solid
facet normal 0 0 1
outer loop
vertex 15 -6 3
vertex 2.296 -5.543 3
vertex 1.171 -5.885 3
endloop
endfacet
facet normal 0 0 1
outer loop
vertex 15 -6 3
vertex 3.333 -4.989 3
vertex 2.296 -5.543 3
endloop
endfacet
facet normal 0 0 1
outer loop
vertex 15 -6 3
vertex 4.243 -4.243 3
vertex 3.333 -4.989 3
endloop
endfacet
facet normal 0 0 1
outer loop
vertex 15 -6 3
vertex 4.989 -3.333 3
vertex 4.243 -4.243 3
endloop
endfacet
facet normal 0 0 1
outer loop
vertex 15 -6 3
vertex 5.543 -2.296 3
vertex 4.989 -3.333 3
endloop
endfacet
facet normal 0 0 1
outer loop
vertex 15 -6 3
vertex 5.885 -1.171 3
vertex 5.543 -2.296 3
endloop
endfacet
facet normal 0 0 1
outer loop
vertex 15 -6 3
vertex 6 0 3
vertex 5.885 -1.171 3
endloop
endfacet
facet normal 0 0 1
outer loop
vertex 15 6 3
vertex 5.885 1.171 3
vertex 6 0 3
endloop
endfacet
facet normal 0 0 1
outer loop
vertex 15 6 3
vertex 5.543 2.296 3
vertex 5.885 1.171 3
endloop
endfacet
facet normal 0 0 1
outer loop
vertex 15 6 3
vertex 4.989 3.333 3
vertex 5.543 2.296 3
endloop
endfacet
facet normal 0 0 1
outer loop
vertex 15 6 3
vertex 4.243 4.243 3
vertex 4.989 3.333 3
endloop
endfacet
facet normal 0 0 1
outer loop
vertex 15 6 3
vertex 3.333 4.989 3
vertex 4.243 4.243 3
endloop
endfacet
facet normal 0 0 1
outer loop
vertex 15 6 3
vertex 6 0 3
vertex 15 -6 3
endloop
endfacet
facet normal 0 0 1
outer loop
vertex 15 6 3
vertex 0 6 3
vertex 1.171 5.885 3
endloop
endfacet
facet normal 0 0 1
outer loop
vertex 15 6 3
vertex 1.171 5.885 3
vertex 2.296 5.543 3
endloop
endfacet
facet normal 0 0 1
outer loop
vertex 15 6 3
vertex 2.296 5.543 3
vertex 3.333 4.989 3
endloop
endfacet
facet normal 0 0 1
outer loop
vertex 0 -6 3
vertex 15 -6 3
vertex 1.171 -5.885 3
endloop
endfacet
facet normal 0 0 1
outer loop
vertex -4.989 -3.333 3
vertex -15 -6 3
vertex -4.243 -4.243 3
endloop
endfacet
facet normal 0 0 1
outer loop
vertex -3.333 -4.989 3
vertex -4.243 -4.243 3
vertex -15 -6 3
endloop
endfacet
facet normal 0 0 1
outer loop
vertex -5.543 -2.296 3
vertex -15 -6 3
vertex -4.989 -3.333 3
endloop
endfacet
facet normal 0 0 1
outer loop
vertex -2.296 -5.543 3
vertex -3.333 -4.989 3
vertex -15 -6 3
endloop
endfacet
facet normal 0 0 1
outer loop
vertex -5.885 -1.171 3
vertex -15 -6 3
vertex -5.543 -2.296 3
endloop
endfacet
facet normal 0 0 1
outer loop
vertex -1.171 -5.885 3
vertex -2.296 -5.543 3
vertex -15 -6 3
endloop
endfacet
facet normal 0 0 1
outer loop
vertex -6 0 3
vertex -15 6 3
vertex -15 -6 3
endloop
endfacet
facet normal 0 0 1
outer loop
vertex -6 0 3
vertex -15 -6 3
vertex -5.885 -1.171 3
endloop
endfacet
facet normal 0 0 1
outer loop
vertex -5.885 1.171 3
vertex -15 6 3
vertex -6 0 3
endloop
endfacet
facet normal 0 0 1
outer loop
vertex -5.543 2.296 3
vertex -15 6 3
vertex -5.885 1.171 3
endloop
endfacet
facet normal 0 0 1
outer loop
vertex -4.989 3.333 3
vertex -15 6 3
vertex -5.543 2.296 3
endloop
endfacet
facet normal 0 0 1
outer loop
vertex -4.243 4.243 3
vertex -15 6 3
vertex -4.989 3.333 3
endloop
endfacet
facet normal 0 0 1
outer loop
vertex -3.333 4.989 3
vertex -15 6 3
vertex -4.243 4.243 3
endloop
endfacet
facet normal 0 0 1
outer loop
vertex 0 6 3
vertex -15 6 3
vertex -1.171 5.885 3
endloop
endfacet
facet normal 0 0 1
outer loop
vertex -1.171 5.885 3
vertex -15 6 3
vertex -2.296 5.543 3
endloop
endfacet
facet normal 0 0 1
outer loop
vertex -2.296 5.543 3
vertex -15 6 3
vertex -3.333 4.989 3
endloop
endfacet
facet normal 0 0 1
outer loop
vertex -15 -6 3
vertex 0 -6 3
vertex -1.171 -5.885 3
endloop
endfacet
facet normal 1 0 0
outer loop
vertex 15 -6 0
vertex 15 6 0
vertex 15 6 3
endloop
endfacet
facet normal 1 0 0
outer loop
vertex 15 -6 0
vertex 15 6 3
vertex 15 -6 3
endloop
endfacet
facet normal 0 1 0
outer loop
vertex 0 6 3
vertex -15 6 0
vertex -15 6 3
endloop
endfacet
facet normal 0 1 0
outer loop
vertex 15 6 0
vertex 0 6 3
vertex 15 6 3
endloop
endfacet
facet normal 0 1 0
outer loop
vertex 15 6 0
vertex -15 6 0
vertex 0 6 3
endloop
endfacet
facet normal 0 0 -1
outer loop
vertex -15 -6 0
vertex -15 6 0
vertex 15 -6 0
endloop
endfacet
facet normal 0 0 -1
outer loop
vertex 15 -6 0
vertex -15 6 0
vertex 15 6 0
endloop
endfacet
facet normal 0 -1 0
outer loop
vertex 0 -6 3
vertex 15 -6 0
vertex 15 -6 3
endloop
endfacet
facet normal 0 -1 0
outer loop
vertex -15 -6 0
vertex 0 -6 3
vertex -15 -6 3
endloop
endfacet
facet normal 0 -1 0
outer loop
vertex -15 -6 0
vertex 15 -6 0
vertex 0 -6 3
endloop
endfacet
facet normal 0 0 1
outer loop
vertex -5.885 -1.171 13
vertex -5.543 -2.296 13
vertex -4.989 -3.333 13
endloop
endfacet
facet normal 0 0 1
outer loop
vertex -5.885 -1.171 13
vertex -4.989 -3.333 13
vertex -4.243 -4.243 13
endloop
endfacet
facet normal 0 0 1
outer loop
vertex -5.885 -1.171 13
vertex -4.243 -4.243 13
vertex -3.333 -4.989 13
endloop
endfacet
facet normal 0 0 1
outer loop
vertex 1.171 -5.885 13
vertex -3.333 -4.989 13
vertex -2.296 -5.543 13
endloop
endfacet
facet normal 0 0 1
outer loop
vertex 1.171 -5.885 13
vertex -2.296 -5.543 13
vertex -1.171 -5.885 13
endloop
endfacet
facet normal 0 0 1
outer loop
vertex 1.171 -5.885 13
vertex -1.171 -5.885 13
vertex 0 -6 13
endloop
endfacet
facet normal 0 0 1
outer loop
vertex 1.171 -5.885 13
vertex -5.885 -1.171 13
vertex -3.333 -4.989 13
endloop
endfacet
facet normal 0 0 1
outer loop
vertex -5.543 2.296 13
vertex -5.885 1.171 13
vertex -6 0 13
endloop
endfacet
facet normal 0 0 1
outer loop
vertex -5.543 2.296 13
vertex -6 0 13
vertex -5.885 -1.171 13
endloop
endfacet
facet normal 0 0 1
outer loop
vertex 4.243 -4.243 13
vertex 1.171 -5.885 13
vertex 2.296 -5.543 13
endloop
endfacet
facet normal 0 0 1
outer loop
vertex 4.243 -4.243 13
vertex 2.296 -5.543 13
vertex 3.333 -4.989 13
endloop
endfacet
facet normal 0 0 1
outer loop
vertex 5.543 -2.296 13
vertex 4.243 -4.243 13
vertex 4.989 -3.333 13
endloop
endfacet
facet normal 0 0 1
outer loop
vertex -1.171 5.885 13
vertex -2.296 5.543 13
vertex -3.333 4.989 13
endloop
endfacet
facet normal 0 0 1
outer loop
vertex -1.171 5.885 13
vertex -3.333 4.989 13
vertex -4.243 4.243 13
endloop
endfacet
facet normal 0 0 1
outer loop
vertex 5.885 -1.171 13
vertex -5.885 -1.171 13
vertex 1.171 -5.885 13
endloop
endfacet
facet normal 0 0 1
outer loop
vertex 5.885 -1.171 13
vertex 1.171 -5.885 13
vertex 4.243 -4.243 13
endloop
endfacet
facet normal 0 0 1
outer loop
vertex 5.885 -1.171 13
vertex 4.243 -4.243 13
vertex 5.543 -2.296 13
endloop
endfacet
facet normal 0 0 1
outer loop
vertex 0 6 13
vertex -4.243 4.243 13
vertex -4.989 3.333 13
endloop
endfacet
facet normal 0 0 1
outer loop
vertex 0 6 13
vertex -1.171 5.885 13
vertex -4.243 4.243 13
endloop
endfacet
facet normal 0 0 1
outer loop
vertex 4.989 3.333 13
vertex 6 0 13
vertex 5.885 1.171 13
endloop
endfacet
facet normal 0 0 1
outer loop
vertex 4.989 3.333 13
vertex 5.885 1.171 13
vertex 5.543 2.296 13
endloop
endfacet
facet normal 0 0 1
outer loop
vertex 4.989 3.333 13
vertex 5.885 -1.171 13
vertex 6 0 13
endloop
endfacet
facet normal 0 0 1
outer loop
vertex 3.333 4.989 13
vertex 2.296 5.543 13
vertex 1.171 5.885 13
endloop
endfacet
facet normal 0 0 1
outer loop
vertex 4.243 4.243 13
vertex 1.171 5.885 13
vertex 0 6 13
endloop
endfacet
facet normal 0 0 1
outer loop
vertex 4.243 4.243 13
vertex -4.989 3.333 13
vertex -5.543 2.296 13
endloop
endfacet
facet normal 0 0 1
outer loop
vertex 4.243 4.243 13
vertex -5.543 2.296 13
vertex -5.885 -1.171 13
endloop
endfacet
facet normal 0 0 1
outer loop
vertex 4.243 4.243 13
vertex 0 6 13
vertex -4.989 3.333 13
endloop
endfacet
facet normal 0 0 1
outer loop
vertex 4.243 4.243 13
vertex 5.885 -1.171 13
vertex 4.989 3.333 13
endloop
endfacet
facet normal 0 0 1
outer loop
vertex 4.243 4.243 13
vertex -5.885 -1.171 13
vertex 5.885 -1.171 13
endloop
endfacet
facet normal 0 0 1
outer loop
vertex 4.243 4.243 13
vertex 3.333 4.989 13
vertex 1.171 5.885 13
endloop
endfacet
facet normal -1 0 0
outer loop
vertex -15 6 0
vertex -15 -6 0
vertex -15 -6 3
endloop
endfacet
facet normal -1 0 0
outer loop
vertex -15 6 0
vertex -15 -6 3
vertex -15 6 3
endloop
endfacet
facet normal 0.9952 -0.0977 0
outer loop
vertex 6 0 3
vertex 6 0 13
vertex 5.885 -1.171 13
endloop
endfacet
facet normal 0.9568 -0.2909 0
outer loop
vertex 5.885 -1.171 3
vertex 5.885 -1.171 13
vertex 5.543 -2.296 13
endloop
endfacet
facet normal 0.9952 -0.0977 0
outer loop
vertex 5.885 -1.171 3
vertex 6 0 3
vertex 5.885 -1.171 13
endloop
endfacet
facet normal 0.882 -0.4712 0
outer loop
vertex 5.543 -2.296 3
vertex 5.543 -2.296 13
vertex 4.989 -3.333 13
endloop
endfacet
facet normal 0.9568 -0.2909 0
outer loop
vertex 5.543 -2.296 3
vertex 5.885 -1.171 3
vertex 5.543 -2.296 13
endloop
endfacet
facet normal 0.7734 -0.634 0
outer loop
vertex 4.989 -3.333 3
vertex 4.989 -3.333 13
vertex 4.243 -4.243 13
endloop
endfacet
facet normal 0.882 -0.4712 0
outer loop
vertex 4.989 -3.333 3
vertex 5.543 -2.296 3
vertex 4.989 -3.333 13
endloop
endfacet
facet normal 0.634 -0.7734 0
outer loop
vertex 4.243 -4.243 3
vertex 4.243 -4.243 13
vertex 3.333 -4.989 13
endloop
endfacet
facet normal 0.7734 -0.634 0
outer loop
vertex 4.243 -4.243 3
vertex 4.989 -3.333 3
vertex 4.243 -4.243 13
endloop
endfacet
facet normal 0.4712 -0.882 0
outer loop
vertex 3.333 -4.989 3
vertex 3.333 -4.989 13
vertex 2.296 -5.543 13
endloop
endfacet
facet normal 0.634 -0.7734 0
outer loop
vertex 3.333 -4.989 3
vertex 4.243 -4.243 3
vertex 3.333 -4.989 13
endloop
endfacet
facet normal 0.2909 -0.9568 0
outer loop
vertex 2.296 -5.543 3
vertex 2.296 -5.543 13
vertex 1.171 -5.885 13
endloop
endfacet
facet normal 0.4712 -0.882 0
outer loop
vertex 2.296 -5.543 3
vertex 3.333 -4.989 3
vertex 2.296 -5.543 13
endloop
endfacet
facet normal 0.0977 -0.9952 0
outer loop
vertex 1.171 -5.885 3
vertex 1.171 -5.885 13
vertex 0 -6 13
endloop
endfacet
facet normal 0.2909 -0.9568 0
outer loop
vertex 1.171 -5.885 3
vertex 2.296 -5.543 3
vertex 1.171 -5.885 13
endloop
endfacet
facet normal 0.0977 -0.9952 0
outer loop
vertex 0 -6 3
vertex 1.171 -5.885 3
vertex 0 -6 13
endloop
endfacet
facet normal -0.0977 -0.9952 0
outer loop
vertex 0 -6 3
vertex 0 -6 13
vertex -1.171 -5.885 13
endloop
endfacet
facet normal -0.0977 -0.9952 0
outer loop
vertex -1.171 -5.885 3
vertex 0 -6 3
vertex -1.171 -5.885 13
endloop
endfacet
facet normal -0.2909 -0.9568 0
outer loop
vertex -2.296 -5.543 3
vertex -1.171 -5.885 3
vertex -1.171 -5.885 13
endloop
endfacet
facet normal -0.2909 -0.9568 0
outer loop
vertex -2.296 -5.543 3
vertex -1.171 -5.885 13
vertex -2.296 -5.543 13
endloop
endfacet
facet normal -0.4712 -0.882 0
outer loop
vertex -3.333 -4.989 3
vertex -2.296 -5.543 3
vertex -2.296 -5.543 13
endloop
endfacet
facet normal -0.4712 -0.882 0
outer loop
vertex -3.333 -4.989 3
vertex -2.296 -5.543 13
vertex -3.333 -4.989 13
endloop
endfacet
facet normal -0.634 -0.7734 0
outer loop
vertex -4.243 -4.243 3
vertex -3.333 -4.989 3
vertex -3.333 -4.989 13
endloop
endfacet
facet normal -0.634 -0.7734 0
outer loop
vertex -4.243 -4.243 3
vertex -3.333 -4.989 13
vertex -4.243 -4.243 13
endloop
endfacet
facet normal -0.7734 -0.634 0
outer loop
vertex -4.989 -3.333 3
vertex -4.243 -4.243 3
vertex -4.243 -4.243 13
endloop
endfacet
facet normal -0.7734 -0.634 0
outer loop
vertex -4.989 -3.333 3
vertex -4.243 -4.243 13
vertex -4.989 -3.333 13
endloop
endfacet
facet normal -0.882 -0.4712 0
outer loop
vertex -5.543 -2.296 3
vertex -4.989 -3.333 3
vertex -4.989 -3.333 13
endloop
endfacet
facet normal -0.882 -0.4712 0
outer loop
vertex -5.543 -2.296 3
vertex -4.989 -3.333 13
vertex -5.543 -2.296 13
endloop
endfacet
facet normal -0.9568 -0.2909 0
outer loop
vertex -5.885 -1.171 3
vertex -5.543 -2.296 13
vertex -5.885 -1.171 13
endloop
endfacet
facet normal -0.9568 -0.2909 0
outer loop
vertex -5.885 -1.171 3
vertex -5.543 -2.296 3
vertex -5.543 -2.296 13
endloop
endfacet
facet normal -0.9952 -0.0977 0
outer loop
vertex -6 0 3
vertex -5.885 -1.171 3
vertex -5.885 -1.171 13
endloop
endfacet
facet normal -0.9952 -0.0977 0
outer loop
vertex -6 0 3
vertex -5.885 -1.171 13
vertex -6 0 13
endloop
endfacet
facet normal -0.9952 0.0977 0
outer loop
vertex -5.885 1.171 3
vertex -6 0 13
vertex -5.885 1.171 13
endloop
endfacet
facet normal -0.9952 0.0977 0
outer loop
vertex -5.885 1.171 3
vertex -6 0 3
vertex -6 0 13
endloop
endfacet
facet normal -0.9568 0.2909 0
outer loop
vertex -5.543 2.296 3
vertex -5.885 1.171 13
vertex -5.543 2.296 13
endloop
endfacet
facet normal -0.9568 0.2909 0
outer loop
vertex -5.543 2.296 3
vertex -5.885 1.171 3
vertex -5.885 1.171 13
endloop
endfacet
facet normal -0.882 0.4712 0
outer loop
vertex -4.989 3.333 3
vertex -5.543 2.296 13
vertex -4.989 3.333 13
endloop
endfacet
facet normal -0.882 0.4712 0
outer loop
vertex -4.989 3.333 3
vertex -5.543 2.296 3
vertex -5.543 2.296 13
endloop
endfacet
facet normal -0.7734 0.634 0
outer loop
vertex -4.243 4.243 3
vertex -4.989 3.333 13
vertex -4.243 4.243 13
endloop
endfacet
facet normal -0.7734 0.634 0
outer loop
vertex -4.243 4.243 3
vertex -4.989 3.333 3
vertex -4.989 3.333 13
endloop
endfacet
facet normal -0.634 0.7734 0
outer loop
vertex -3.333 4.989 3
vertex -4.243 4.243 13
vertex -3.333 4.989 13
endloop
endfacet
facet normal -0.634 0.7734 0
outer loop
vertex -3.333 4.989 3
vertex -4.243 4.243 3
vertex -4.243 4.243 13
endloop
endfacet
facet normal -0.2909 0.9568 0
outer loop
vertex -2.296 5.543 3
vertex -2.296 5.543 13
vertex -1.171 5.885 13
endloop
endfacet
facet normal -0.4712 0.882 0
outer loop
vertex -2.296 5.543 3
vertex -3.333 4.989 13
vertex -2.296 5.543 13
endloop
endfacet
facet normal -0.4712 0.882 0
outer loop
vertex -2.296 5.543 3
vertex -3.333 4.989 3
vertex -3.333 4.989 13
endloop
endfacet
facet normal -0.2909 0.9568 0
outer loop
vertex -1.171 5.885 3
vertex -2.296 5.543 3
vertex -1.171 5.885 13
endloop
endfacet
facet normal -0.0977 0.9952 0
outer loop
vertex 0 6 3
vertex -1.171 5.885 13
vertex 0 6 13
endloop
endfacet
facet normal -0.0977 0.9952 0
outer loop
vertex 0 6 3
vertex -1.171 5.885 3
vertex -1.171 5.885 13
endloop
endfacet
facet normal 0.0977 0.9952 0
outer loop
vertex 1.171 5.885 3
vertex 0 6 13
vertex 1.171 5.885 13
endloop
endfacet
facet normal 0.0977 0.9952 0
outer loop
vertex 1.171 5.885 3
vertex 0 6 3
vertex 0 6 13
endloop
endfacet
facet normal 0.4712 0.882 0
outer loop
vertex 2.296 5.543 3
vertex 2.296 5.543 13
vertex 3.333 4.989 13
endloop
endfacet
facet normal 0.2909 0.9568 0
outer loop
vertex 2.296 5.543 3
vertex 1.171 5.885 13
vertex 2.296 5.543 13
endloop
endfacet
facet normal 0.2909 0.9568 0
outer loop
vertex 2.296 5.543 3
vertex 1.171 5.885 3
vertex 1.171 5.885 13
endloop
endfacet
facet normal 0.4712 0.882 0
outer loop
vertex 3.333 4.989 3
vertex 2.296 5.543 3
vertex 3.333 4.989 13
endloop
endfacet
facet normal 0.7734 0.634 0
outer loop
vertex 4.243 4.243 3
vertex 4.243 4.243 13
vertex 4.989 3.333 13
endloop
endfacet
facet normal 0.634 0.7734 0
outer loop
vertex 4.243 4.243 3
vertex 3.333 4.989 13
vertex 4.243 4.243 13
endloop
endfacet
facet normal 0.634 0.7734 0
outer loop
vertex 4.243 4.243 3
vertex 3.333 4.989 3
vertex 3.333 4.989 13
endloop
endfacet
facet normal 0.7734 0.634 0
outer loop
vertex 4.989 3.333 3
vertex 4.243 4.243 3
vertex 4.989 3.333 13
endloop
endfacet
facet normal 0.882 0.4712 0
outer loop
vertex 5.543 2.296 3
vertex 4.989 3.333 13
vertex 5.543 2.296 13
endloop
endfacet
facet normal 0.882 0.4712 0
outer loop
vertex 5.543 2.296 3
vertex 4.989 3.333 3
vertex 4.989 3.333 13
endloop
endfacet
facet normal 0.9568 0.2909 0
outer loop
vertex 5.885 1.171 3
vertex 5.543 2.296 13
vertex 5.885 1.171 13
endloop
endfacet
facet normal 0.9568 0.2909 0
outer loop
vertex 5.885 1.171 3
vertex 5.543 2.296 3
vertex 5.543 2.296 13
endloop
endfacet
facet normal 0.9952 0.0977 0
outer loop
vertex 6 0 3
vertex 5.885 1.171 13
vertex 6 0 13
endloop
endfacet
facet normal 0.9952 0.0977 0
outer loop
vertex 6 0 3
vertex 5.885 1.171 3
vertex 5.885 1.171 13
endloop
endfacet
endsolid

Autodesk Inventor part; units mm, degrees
ref_plane "YZ Plane" through (0, 0, 0) normal (1, 0, 0) x (0, 1, 0)
ref_plane "XZ Plane" through (0, 0, 0) normal (0, 1, 0) x (-1, 0, 0)
ref_plane "XY Plane" through (0, 0, 0) normal (0, 0, 1) x (1, 0, 0)
sketch "Sketch1" plane through (0, 0, 0) normal (0, 0, 1) x (1, 0, 0)
  line L0 (-15, 6) -> (15, 6)
  line L1 (15, 6) -> (15, -6)
  line L2 (15, -6) -> (-15, -6)
  line L3 (-15, -6) -> (-15, 6)
  line L4 (-15, 6) -> (15, -6) construction
  line L5 (15, 6) -> (-15, -6) construction
  point P0 (0, 0)
  dimension "d0" = 30
  dimension "d1" = 12
extrude "Extrusion1" add sketch "Sketch1" along normal blind 3
sketch "Sketch2" plane through (0, 0, 3) normal (0, 0, 1) x (1, 0, 0)
  circle A0 centre (0, 0) radius 6
  dimension "d4" = 12
extrude "Extrusion2" add sketch "Sketch2" along normal blind 10
thread "Thread2" size "M12x1.75" class "6g" standard "ANSI Metric M Profile" length 5
properties part number "BOTTOM STOPPER" material "Steel, Alloy"
